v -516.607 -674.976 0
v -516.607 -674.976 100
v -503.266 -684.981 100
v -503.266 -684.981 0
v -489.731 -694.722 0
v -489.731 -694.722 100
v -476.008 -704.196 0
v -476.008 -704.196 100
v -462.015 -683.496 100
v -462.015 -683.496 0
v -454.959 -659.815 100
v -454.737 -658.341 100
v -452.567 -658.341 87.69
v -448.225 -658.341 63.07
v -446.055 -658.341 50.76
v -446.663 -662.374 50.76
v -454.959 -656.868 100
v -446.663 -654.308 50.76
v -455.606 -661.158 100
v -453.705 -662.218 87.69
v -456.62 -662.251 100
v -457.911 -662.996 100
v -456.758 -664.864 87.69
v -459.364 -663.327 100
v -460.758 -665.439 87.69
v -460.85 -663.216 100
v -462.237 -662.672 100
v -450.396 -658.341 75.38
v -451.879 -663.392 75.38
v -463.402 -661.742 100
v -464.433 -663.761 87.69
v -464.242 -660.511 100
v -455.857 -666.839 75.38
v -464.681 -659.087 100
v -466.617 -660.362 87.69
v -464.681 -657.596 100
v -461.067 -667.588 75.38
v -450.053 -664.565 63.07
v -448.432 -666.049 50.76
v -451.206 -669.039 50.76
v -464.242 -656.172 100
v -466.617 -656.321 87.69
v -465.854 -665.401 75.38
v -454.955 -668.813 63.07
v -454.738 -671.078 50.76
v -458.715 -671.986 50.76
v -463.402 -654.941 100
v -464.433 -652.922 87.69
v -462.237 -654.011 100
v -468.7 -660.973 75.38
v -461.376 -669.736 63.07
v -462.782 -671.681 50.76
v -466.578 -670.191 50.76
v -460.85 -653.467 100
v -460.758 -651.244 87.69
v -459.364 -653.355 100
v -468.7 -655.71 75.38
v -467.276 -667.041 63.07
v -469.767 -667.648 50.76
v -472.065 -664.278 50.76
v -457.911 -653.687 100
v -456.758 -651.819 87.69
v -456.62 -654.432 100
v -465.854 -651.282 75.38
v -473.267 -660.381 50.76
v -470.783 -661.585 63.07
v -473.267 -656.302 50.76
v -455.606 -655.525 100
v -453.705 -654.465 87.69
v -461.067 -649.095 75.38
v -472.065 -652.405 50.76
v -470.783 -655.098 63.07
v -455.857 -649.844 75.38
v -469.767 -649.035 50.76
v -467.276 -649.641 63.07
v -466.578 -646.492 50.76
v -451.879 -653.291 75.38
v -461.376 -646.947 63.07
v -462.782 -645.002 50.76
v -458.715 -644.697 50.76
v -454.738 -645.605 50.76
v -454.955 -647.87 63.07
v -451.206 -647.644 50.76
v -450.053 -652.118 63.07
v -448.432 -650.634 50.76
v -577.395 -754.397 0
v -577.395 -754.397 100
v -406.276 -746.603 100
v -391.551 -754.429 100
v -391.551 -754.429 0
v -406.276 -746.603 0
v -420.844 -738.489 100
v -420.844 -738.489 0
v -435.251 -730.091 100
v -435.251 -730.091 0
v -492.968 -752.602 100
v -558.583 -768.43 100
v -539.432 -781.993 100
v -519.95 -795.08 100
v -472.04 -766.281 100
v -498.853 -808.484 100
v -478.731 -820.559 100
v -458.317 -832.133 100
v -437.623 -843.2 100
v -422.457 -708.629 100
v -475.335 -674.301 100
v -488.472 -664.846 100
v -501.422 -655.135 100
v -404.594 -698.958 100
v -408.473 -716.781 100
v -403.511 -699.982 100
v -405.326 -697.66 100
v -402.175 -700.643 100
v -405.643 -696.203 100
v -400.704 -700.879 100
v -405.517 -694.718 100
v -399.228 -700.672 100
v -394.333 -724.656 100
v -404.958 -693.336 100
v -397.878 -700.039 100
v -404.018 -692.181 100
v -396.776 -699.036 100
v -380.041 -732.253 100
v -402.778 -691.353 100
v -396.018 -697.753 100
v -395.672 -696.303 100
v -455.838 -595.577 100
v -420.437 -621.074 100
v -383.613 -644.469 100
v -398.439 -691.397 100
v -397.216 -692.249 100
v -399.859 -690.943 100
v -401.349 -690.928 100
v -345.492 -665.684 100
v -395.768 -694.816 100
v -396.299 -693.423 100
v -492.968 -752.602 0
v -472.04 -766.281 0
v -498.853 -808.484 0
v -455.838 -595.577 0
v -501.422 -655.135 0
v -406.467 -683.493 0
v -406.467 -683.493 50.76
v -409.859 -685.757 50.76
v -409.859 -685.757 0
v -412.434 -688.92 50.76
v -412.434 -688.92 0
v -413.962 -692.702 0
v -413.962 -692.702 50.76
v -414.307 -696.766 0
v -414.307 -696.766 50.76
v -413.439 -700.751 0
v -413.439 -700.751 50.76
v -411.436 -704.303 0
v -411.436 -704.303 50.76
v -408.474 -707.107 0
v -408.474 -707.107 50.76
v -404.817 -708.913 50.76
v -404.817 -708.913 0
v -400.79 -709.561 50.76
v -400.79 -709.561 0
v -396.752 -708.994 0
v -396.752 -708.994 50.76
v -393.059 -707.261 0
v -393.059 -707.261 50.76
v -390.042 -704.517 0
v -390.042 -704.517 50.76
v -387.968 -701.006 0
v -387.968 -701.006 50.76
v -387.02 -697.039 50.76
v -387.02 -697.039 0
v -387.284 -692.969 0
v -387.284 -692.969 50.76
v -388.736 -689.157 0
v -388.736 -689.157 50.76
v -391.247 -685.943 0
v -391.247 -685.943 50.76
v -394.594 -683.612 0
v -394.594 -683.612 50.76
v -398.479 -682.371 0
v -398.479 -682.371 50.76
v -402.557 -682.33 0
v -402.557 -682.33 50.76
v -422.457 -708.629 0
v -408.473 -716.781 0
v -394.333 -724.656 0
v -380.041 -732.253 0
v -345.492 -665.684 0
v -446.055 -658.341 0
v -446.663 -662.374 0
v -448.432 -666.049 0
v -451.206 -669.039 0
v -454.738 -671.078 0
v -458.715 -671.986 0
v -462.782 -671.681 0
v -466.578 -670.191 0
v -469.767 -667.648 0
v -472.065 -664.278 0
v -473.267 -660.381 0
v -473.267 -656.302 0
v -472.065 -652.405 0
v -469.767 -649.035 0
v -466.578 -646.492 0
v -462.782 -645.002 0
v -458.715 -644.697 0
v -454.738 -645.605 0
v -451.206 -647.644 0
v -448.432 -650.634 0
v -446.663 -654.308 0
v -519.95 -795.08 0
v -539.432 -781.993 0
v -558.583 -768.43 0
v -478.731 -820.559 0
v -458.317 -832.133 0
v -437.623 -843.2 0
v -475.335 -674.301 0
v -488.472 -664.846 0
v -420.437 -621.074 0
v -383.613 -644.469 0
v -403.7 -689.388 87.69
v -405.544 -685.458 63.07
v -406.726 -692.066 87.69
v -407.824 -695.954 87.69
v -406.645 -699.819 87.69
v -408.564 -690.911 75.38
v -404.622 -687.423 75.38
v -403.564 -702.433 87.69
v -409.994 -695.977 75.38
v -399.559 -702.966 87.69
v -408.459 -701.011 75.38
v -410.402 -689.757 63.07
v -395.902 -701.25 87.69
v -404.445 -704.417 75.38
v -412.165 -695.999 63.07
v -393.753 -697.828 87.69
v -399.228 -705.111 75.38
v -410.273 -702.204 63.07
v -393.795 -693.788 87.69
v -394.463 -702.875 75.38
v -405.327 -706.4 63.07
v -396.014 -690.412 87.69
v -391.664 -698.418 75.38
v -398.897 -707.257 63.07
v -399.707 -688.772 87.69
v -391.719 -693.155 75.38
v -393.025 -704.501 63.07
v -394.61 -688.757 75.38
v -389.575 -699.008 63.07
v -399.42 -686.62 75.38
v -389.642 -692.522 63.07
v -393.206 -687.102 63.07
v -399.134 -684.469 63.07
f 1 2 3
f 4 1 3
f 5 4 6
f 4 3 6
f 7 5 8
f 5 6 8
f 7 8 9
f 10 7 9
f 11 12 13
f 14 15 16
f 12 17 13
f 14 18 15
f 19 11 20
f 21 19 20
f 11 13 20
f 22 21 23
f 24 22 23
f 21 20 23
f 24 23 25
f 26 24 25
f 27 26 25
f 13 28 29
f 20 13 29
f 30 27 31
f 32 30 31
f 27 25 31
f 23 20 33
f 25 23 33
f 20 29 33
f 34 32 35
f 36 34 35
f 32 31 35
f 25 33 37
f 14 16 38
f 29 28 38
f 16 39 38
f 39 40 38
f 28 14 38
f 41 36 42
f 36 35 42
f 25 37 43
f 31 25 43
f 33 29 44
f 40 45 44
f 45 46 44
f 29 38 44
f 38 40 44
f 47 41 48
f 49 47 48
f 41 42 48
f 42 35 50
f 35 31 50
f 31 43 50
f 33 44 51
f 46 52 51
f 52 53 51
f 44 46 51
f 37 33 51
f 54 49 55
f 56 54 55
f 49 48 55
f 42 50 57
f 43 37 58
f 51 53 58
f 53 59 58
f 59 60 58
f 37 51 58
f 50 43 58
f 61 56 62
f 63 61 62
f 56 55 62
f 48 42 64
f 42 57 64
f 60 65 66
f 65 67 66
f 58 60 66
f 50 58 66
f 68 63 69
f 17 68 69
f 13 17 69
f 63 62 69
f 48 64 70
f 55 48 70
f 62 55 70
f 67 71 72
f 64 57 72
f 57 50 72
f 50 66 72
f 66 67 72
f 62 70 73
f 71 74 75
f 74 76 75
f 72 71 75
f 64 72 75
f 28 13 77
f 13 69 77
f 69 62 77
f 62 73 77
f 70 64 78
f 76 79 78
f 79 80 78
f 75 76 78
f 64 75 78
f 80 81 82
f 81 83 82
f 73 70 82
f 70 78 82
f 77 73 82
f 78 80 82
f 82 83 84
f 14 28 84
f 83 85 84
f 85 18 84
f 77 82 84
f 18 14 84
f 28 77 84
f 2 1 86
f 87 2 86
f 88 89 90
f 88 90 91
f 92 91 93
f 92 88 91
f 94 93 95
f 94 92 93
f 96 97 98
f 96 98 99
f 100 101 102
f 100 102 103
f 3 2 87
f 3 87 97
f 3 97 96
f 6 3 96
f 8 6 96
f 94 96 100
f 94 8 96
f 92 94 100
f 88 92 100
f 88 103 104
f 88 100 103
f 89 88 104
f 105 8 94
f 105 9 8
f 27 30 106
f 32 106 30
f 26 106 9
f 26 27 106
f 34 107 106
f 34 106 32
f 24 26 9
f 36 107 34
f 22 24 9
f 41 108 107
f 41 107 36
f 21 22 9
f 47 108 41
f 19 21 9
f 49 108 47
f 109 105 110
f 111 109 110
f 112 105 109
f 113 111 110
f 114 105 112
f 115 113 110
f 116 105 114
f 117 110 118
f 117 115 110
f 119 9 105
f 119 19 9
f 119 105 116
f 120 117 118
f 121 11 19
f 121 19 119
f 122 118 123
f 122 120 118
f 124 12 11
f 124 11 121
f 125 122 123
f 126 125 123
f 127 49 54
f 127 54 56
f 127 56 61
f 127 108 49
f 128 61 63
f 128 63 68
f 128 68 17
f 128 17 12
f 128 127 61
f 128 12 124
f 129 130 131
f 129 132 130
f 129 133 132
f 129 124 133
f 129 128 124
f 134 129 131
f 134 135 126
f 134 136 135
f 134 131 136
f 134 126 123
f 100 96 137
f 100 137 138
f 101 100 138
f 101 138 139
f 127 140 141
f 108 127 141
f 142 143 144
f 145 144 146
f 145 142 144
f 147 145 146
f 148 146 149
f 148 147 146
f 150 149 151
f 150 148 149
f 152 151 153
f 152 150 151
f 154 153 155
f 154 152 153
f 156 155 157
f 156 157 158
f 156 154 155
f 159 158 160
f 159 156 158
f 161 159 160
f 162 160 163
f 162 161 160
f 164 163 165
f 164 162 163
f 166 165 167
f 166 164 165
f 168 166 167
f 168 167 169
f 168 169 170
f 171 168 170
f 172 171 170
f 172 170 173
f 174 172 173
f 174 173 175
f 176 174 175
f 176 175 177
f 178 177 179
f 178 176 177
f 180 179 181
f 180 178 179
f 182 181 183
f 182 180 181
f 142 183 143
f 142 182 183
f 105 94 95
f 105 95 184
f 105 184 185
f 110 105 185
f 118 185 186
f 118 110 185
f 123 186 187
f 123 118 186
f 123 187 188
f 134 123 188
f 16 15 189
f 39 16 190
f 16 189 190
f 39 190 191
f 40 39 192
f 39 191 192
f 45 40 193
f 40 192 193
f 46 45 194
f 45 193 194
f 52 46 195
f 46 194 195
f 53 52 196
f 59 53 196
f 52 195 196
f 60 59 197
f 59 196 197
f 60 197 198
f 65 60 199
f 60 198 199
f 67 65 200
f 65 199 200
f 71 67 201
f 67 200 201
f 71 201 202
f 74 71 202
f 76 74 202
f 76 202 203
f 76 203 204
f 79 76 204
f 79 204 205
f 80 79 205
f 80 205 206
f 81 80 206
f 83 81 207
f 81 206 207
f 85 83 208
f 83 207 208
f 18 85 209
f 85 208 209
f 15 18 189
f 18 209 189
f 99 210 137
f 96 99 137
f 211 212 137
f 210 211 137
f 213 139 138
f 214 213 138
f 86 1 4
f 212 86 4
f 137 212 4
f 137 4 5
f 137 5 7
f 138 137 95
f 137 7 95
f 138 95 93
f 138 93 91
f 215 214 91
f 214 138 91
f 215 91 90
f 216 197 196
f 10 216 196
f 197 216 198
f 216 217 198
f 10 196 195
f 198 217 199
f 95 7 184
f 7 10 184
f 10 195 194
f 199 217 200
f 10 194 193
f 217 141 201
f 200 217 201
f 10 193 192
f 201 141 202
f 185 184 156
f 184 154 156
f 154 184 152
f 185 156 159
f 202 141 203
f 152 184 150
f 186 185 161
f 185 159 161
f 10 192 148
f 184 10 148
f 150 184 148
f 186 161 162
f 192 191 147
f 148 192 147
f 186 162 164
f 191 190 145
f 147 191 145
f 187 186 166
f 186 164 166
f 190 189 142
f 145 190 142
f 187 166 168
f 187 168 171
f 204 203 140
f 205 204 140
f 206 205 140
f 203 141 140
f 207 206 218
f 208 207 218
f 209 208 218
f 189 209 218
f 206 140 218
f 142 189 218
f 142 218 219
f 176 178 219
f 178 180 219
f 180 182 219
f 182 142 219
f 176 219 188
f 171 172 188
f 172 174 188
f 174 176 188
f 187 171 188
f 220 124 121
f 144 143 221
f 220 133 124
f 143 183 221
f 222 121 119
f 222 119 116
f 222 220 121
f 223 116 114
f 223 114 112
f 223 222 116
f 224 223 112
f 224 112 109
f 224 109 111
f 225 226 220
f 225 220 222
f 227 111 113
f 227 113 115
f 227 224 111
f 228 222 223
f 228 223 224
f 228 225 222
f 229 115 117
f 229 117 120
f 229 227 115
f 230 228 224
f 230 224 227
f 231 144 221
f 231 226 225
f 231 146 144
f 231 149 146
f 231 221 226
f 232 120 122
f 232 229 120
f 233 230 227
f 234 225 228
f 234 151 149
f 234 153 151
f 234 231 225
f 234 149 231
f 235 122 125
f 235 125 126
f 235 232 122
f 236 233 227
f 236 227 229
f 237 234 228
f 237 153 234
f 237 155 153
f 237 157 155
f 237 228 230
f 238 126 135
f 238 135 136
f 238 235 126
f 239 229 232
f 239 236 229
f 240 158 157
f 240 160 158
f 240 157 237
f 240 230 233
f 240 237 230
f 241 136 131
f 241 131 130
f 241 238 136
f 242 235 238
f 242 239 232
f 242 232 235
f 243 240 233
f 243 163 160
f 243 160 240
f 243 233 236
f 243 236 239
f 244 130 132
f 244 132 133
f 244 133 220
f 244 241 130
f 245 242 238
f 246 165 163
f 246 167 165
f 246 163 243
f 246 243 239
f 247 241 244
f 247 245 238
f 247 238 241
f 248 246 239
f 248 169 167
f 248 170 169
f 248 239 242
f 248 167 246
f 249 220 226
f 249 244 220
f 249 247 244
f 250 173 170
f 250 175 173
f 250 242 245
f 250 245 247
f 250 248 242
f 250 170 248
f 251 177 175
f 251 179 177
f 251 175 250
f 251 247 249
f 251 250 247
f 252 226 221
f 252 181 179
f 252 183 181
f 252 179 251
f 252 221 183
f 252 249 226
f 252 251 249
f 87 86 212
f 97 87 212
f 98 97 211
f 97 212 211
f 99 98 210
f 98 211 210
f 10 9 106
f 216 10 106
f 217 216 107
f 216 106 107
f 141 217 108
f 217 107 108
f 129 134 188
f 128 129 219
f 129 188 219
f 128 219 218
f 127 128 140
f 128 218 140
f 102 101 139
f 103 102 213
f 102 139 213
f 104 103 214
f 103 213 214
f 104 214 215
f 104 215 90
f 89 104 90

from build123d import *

# Parameters (mm, degrees)
EXTRUDE_1_DEPTH     = 100
CUT_EXTRUDE_1_DEPTH = 1027.825534296
CUT_EXTRUDE_2_DEPTH = 100


with BuildPart() as part:
    # 草图1 → 凸台-拉伸1 (new body)
    with BuildSketch(Plane.XY):
        with BuildLine():
            Line((-455.837805225, -595.576943247), (-577.394553286, -754.397461446))
            ThreePointArc((-577.394553286, -754.397461446), (-509.447321611, -801.850002496), (-437.622888206, -843.199980858))
            Line((-437.622888206, -843.199980858), (-345.491753847, -665.684195414))
            ThreePointArc((-345.491753847, -665.684195414), (-402.195253903, -633.039475655), (-455.837805225, -595.576943247))
        make_face()
    extrude(amount=EXTRUDE_1_DEPTH)

    # 草图2 → 切除-拉伸1 (cut, through all)
    with BuildSketch(Plane.XY.offset(100)):
        Polygon((-472.039544491, -766.28120979), (-498.852561418, -808.4838415), (-500.293413788, -812.59937229), (-523.195250823, -798.324469225), (-519.950393134, -795.079611536), (-492.967880598, -752.602438021), align=None)
    extrude(amount=-CUT_EXTRUDE_1_DEPTH, mode=Mode.SUBTRACT)

    # 草图4 → 切除-旋转1 (revolve, cut)
    with BuildSketch(Plane(origin=(-29.5994078, 18.802248971, 0), x_dir=(0, 0, -1), z_dir=(0.8440969905384018, -0.5361905170403645, 0)), mode=Mode.PRIVATE) as cut_revolve_1_sk:
        Polygon((-100, -802.210780827), (-100, -797.210780827), (-50.759612349, -788.528371944), (0, -788.528371944), (0, -802.210780827), align=None)
    cut_revolve_1 = revolve(cut_revolve_1_sk.sketch.rotate(Axis((-459.737221147, -658.341456902, 100), (0, 0, -1)), 57.57531458), axis=Axis((-459.737221147, -658.341456902, 100), (0, 0, -1)), mode=Mode.SUBTRACT)

    # 镜向1: 切除-旋转1 across plane
    add(cut_revolve_1.mirror(Plane(origin=(0, 0, 0), x_dir=(0, 0, 1), z_dir=(-0.8440526342067589, 0.5362603385377582, 0))), mode=Mode.SUBTRACT)

    # 草图6 → 切除-拉伸2 (cut)
    with BuildSketch(Plane.XY.offset(100)):
        with BuildLine():
            Line((-501.421585748, -655.134637572), (-516.607469043, -674.975821978))
            ThreePointArc((-516.607469043, -674.975821978), (-496.522608458, -689.884727049), (-476.007750242, -704.196179367))
            Line((-476.007750242, -704.196179367), (-462.015311929, -683.496050861))
            ThreePointArc((-462.015311929, -683.496050861), (-481.927127678, -669.605289411), (-501.421585748, -655.134637572))
        make_face()
        with BuildLine():
            Line((-380.040929232, -732.252614955), (-391.550719321, -754.429368148))
            ThreePointArc((-391.550719321, -754.429368148), (-413.579890996, -742.581518144), (-435.250907035, -730.090600714))
            Line((-435.250907035, -730.090600714), (-422.456532439, -708.62929533))
            ThreePointArc((-422.456532439, -708.62929533), (-401.422544589, -720.753037243), (-380.040929232, -732.252614955))
        make_face()
    extrude(amount=-CUT_EXTRUDE_2_DEPTH, mode=Mode.SUBTRACT)


solid = part.part
